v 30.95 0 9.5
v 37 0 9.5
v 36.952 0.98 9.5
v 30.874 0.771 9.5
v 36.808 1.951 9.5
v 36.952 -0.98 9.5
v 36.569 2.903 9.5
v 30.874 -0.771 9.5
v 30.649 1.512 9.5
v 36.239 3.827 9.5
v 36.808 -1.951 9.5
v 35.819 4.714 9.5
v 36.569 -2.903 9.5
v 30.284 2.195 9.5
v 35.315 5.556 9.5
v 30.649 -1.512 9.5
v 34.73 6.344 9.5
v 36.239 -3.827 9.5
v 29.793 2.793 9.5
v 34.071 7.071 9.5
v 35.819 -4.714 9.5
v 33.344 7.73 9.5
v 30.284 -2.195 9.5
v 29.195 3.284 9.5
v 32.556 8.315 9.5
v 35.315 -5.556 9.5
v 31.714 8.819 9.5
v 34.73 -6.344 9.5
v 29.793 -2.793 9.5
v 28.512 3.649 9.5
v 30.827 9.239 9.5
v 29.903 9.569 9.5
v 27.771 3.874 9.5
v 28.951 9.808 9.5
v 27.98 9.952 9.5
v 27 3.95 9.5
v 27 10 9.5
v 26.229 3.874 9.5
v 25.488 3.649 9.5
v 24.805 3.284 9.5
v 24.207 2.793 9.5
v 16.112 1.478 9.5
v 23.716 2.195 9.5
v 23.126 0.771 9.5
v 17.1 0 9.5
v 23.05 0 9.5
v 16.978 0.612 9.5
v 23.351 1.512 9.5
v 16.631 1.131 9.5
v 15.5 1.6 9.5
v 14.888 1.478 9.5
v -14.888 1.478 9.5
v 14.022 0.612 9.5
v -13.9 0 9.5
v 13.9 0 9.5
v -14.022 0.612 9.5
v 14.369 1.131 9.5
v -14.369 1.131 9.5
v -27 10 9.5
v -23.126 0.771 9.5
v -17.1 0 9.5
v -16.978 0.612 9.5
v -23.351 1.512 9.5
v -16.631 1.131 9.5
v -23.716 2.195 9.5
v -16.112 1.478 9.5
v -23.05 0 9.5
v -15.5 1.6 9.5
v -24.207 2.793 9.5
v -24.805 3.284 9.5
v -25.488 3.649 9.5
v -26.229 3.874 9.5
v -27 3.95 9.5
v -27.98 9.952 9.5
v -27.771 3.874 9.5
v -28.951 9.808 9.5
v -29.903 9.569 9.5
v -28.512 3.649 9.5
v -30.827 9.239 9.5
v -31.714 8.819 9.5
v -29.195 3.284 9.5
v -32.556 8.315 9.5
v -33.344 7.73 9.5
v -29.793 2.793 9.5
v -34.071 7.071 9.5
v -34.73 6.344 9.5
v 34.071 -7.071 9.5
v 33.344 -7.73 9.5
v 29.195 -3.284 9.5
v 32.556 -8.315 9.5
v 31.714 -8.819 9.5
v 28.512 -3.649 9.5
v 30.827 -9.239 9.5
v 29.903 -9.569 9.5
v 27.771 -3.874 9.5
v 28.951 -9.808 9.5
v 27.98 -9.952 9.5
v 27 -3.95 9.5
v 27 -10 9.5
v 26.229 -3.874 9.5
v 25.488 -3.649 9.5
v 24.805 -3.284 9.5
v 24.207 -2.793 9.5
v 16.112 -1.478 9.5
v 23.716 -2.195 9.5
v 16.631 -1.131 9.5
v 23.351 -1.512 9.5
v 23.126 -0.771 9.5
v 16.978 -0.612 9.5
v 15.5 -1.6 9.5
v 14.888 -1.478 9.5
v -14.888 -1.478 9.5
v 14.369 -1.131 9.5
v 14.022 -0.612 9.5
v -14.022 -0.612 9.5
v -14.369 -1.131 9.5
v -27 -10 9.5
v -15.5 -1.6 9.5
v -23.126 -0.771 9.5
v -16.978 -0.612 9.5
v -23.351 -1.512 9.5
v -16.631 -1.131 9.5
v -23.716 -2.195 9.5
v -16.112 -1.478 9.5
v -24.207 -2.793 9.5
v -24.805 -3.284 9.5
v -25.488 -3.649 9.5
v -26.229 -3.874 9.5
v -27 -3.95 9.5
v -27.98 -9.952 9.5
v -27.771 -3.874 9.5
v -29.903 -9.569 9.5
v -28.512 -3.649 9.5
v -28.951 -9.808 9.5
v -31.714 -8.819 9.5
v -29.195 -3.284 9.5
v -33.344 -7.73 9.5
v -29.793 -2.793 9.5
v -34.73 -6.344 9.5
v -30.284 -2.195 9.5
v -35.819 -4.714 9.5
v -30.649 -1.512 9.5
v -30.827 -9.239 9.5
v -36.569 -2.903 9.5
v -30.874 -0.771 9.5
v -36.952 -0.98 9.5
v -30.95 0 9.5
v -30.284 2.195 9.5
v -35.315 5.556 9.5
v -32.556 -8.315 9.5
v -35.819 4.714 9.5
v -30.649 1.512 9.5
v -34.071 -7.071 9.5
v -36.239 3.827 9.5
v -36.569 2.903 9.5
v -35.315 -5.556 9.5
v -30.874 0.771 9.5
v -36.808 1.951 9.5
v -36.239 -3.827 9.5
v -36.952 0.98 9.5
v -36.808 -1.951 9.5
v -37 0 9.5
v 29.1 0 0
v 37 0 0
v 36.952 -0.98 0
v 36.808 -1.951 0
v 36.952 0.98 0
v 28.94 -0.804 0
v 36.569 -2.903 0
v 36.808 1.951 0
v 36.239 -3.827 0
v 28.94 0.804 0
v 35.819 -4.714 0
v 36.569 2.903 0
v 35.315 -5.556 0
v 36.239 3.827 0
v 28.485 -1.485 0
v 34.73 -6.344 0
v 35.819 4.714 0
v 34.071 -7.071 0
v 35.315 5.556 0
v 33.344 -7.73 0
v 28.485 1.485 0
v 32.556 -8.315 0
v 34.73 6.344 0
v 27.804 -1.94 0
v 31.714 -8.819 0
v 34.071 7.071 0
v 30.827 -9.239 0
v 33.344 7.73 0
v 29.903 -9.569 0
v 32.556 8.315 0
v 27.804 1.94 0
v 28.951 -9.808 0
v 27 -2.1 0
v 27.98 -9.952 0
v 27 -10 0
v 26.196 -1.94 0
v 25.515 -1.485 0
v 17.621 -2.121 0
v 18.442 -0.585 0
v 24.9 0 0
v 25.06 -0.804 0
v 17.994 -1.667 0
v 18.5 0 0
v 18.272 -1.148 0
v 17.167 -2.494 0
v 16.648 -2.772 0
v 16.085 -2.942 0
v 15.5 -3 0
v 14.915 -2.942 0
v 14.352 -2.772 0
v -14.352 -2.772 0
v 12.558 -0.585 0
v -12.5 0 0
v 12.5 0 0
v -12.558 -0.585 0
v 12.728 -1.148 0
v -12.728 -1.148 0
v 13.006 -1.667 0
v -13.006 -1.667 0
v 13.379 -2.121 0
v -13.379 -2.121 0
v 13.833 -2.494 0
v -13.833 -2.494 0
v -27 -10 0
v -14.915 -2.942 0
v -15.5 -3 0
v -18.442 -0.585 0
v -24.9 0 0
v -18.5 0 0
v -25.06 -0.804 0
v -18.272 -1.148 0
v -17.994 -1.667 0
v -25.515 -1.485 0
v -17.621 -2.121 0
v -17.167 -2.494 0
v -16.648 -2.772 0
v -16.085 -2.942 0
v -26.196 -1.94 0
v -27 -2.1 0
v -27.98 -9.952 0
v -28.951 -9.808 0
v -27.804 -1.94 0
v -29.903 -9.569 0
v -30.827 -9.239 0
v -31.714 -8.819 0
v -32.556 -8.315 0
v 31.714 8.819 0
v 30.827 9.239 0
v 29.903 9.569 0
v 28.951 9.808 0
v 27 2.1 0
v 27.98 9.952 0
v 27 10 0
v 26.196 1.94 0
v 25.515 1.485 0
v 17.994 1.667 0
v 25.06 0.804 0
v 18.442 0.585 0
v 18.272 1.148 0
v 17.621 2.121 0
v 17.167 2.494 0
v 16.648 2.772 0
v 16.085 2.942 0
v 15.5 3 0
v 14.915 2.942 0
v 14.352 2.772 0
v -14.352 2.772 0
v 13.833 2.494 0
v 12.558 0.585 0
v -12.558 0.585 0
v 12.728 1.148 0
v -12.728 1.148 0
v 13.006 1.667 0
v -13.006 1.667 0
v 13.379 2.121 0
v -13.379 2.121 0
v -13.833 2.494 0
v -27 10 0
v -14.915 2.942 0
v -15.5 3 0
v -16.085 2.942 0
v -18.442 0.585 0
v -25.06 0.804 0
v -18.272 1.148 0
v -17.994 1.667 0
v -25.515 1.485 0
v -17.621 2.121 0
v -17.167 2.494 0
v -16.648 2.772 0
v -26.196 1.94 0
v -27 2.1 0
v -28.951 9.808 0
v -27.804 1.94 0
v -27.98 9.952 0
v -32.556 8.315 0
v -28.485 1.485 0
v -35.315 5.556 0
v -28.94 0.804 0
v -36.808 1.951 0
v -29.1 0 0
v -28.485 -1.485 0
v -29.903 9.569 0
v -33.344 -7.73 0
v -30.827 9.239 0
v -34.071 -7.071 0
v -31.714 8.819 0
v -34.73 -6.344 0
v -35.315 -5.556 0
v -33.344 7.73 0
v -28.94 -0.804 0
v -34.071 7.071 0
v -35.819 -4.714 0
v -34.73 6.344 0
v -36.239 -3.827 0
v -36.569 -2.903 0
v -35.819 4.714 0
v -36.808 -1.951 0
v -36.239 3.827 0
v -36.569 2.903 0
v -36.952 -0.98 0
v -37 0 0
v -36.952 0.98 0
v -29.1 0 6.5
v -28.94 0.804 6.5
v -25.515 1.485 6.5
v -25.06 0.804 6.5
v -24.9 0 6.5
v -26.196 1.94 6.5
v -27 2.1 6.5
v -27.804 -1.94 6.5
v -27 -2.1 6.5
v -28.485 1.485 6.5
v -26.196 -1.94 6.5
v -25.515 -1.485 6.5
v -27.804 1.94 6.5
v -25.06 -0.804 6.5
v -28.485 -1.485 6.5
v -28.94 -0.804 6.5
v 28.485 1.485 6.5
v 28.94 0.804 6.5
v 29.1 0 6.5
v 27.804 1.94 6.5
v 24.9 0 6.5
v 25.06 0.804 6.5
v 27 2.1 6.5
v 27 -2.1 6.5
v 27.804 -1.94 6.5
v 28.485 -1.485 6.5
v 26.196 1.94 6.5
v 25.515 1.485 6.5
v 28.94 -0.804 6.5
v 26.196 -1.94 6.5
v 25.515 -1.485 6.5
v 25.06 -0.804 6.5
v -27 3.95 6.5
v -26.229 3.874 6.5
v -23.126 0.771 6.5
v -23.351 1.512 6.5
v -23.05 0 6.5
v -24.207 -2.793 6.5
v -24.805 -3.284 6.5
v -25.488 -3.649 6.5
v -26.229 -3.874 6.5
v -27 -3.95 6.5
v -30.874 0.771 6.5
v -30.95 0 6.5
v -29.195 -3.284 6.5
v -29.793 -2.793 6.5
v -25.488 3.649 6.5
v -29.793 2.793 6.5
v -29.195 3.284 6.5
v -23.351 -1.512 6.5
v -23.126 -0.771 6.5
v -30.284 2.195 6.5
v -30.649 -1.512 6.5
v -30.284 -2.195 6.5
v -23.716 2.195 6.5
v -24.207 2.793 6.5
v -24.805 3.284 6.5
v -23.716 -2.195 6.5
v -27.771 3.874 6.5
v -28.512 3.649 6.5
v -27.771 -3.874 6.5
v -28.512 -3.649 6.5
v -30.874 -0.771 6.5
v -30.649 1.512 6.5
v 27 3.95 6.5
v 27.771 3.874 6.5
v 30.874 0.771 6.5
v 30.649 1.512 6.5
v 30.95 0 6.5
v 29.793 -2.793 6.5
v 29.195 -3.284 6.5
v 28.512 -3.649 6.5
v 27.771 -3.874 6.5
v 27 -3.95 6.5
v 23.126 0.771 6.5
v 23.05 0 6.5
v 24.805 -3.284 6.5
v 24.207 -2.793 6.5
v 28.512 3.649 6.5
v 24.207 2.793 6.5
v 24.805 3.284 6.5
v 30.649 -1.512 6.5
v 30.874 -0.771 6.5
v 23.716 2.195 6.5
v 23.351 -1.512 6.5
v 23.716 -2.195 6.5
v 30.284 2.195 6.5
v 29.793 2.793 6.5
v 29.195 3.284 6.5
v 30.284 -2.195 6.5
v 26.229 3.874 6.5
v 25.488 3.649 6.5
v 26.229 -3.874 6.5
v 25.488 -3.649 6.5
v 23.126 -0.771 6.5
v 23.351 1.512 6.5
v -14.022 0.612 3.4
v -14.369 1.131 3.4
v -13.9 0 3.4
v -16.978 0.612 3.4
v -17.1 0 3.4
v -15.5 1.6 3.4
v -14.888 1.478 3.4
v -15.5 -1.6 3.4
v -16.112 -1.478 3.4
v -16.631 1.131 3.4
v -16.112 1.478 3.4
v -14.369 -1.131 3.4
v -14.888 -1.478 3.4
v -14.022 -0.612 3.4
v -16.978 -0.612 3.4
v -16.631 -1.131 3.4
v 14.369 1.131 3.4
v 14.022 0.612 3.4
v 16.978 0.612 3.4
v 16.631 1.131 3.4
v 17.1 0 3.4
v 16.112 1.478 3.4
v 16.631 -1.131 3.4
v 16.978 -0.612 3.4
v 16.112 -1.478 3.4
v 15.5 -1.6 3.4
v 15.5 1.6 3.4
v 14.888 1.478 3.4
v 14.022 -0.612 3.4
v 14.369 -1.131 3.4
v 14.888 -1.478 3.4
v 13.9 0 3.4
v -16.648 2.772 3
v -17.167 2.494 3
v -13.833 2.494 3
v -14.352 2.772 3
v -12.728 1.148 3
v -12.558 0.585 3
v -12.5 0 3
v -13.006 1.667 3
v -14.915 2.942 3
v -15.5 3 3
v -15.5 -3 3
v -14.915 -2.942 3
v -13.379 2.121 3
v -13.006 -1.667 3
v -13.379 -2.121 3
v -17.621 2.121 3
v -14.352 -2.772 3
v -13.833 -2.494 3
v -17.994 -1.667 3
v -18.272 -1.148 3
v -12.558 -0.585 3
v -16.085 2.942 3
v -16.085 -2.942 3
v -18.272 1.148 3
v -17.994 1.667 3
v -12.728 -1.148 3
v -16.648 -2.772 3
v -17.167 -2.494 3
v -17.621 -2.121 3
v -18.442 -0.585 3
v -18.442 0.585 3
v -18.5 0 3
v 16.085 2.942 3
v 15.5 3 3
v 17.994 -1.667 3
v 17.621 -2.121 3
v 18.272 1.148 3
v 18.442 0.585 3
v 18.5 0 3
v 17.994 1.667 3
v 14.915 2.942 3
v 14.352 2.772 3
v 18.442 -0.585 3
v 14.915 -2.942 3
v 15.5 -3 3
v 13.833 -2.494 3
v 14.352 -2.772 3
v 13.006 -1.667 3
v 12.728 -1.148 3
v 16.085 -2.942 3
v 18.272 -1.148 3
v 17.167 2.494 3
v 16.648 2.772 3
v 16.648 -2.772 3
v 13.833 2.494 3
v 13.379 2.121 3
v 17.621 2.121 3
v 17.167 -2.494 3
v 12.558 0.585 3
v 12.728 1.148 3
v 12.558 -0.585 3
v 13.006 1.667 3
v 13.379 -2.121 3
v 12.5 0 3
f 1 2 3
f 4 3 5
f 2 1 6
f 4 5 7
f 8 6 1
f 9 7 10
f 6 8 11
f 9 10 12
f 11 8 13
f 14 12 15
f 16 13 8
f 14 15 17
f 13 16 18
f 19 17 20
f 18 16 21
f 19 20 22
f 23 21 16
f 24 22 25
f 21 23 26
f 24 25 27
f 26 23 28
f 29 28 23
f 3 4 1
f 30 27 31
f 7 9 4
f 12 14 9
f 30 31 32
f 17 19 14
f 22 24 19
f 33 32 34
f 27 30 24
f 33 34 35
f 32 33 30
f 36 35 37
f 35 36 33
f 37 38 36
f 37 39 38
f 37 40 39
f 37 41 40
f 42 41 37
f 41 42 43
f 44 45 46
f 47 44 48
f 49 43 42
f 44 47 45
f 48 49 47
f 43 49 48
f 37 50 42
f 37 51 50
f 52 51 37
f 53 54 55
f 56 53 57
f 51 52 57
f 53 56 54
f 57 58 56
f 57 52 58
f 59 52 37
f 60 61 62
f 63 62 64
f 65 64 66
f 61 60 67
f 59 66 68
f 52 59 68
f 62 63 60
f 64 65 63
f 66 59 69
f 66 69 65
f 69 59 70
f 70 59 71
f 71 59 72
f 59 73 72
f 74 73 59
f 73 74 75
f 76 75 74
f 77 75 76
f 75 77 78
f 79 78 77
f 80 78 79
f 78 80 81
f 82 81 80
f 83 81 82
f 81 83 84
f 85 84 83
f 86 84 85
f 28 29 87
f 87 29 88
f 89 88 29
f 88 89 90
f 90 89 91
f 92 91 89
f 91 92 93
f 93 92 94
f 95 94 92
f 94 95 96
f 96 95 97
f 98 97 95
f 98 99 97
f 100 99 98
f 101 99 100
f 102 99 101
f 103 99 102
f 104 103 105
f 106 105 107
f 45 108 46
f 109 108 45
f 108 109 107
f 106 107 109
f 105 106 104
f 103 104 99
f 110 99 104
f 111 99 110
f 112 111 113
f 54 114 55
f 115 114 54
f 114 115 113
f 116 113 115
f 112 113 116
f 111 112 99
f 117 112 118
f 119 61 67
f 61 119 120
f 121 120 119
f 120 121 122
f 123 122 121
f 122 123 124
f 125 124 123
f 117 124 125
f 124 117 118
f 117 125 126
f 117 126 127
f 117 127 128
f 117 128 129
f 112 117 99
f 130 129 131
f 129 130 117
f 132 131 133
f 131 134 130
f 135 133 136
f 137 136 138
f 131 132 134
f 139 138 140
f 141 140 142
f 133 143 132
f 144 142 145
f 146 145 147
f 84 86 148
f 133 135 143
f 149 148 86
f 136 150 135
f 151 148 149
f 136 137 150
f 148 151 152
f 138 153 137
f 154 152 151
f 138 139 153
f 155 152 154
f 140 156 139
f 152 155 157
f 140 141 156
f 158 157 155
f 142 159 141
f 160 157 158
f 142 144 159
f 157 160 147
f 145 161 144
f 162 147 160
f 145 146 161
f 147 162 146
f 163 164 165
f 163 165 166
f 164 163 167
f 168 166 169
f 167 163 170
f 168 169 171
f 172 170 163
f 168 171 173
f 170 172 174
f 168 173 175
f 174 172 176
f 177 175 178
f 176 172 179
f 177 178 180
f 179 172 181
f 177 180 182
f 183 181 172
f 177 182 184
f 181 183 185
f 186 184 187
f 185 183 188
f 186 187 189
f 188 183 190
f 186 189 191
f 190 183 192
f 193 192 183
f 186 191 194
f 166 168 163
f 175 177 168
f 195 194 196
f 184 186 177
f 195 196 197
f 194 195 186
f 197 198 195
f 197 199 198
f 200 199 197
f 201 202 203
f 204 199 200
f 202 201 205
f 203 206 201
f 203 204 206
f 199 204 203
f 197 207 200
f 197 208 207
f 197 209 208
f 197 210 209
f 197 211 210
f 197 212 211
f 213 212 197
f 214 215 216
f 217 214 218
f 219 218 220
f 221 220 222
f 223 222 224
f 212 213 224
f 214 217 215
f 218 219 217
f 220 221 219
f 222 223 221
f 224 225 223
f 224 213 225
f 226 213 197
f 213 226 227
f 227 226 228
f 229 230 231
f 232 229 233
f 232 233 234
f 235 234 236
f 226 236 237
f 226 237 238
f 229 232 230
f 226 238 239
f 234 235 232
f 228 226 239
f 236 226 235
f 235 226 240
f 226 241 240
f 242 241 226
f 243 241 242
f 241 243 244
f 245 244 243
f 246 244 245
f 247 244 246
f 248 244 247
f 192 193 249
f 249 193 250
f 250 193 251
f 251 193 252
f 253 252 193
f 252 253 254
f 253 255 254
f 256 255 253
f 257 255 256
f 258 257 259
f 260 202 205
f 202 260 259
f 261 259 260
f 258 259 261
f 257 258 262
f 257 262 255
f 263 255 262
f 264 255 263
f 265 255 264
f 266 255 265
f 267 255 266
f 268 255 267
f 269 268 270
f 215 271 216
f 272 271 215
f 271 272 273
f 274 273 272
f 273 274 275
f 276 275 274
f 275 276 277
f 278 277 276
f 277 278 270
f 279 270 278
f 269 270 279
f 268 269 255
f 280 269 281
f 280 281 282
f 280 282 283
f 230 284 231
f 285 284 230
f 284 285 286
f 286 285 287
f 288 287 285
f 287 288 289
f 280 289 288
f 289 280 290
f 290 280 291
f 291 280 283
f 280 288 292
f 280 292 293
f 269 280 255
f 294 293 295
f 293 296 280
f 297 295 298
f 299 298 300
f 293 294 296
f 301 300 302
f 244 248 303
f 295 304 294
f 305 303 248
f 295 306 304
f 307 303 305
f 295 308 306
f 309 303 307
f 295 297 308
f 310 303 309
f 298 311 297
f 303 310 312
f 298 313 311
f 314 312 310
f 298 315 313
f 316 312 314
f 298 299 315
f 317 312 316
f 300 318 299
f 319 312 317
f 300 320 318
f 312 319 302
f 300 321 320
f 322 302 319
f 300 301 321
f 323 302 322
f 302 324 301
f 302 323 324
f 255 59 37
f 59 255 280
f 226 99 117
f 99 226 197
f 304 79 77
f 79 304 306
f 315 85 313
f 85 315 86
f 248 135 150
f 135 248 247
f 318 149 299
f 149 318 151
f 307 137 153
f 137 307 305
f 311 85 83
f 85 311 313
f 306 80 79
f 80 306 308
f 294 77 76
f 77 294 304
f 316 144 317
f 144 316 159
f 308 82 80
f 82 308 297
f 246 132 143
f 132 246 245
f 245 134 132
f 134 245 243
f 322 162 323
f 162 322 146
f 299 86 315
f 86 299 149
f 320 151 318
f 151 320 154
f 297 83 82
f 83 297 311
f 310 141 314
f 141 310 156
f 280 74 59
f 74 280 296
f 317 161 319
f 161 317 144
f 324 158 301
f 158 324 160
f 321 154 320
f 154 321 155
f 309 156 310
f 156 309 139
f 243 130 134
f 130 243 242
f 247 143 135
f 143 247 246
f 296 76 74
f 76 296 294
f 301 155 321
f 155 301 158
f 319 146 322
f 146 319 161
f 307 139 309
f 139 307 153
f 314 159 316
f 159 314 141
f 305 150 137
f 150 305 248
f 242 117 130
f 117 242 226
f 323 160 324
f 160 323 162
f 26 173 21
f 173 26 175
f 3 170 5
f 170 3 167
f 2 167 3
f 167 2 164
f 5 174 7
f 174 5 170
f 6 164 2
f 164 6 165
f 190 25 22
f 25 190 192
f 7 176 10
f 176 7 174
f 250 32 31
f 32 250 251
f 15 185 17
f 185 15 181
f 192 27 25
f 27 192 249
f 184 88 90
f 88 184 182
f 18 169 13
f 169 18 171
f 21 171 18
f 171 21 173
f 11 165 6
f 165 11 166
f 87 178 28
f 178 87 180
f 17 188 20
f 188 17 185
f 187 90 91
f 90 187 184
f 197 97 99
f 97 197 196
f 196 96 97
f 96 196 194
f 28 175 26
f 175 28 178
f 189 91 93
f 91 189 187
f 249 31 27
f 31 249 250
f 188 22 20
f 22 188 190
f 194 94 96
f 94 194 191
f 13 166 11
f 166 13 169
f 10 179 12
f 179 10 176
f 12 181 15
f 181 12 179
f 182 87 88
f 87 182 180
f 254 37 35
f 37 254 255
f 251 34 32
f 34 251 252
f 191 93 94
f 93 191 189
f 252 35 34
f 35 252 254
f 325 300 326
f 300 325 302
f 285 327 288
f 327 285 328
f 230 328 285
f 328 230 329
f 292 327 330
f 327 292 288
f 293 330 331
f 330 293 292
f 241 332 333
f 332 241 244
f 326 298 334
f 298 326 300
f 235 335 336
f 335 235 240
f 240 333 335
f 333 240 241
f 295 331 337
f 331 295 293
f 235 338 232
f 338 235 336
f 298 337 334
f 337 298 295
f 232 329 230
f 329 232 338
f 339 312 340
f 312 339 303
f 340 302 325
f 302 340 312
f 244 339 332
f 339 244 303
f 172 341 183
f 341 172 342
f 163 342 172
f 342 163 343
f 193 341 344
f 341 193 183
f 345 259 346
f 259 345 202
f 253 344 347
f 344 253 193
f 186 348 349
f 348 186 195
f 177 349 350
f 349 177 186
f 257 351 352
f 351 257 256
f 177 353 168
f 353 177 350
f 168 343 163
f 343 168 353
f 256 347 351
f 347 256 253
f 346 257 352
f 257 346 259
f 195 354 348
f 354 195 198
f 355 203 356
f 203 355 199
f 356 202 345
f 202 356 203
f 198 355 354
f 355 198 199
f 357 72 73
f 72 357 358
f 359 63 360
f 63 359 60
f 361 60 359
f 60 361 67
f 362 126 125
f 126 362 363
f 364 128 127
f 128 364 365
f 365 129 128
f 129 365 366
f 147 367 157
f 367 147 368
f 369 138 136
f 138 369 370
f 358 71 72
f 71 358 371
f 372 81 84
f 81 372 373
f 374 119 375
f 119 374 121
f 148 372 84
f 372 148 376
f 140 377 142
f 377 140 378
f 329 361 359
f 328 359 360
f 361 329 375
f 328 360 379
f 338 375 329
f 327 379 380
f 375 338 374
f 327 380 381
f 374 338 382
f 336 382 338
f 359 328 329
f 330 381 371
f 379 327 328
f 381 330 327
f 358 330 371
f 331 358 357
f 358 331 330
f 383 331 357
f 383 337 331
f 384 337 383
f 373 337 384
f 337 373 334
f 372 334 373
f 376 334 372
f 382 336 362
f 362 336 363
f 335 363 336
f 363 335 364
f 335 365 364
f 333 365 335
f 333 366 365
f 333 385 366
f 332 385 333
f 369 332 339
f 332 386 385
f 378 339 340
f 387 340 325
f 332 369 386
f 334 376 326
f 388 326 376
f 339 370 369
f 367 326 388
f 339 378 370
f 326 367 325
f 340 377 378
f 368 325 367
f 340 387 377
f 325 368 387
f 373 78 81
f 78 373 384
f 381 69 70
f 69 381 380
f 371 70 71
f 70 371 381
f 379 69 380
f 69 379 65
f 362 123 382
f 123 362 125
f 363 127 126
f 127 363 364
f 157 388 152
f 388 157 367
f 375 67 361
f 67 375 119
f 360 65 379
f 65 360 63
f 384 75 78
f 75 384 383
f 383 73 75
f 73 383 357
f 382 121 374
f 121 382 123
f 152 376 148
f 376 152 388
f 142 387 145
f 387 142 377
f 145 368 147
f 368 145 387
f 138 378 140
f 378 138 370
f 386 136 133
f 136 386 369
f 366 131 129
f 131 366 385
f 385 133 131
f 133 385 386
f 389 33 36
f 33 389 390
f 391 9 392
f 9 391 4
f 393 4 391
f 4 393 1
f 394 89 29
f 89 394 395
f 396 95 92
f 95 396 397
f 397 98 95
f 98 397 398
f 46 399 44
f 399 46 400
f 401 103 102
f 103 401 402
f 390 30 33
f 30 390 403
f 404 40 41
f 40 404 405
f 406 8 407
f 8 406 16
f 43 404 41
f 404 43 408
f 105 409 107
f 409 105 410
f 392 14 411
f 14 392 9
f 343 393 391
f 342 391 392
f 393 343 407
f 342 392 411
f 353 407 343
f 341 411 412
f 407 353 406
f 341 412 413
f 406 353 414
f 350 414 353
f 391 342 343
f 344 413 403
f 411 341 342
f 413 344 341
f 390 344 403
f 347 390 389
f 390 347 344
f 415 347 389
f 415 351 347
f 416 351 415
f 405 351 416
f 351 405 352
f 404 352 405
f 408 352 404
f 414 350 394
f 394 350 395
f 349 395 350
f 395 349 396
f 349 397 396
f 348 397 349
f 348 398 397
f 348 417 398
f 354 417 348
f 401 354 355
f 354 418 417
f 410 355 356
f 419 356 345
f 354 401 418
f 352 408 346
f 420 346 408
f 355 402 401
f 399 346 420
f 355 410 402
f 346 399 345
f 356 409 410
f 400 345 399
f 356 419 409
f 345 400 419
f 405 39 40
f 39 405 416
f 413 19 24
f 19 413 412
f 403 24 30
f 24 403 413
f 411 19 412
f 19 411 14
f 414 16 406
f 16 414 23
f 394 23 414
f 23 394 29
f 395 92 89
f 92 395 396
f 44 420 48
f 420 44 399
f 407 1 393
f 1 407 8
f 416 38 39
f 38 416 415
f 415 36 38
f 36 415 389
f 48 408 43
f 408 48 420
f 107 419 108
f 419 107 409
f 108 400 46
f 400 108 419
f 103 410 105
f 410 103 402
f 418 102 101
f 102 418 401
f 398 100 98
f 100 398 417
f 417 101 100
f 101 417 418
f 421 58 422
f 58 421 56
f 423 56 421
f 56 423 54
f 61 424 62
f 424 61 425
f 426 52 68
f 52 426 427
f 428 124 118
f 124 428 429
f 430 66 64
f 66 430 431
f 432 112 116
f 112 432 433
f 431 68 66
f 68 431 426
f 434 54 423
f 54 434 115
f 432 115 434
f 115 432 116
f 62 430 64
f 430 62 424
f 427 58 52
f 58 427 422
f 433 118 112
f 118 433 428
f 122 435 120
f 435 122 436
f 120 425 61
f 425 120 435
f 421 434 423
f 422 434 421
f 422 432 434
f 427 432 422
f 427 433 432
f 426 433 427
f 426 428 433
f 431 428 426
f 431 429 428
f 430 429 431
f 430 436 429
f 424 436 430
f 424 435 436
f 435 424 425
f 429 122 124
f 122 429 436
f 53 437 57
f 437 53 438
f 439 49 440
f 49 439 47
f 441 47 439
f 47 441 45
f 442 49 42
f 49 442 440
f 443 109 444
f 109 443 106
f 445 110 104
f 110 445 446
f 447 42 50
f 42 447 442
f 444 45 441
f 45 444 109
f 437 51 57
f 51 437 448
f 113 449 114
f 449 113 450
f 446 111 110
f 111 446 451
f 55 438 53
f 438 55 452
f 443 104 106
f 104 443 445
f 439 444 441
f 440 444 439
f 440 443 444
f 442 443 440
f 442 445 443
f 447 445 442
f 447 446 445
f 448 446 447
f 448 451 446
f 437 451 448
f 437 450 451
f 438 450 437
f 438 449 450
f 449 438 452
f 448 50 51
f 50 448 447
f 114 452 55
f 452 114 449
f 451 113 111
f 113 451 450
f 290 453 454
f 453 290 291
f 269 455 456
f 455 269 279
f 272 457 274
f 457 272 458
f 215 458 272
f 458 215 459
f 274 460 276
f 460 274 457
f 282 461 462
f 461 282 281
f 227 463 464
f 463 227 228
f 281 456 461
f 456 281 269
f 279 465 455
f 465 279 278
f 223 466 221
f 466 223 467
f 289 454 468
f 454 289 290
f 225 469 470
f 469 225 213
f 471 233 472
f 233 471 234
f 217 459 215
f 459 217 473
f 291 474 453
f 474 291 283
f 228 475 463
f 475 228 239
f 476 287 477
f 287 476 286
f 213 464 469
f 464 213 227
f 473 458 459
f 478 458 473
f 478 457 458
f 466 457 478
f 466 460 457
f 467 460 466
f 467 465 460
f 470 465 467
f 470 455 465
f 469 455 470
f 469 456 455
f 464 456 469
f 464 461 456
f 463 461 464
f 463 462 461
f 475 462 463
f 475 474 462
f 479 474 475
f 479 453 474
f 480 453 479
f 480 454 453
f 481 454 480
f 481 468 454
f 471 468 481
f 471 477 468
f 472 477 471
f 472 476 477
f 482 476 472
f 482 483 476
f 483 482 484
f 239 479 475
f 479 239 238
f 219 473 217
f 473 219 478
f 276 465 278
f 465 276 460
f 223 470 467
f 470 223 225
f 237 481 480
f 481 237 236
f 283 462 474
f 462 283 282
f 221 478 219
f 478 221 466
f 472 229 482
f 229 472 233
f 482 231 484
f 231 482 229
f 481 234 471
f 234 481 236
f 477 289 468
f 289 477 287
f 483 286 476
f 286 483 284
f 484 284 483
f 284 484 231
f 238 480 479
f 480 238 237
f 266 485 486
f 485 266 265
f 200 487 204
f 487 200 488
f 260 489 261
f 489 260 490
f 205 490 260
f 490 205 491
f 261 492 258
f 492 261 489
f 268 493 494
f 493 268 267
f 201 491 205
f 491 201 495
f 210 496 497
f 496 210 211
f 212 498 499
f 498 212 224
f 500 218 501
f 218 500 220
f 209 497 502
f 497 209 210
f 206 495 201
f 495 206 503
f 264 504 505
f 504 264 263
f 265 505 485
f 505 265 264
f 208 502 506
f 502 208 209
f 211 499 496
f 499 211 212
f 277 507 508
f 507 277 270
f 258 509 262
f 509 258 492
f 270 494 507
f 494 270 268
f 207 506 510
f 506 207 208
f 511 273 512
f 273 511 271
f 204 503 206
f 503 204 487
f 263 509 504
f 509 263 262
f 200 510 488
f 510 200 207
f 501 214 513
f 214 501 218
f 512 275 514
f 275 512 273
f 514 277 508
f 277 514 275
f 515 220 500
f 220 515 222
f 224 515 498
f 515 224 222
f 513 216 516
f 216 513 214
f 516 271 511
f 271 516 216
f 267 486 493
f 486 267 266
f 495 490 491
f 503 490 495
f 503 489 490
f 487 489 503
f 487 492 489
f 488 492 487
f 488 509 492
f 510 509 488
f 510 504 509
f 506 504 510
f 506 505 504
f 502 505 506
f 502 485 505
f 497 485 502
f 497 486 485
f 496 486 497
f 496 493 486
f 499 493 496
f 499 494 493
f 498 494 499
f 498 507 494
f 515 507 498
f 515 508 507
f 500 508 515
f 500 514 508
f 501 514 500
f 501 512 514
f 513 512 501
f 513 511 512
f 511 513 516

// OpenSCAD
// Mounting brackey for Ormerod extruder on 2020 Kossel
// The body screws on a JK42HS34-1334A motor are 26mm long and are recessed by 2.5mm, total 28.5mm.
// Therefore we can use a 35mm screw to fix trhe bracket to the motor if the screw goes through 6.5mm of plastic.

width=20;
m3headClear=5.6+0.4;
m3clear=3+0.2;
m3headDepth=3;
thickness=6.5+m3headDepth;
m4clear=4+0.2;
m4headClear=7.5+0.4;
m4headDepth=3;

nema17holeSpacing=31;
nema17body=42;

mountingHoleSpacing = nema17body + 2*6;
overlap=0.02;

difference() {
	union() {
		translate([0,0,thickness/2]) cube([mountingHoleSpacing,width,thickness],center=true);
		translate([-mountingHoleSpacing/2,0,0]) cylinder(r=width/2,h=thickness, $fn=64);
		translate([mountingHoleSpacing/2,0,0]) cylinder(r=width/2,h=thickness, $fn=64);
	}

	translate([-mountingHoleSpacing/2,0,-overlap]) cylinder(r=m4clear/2,h=thickness+2*overlap, $fn=16);
	translate([mountingHoleSpacing/2,0,-overlap]) cylinder(r=m4clear/2,h=thickness+2*overlap, $fn=16);
	translate([-mountingHoleSpacing/2,0,thickness-m4headDepth])
		cylinder(r=m4headClear/2,h=thickness, $fn=32);
	translate([mountingHoleSpacing/2,0,thickness-m4headDepth])
		cylinder(r=m4headClear/2,h=thickness, $fn=32);


	translate([-nema17holeSpacing/2,0,m3headDepth+0.4]) cylinder(r=m3clear/2,h=thickness, $fn=16);
	translate([nema17holeSpacing/2,0,m3headDepth+0.4]) cylinder(r=m3clear/2,h=thickness, $fn=16);

	translate([-nema17holeSpacing/2,0,-overlap])
		cylinder(r=m3headClear/2,h=m3headDepth+overlap, $fn=32);
	translate([nema17holeSpacing/2,0,-overlap])
		cylinder(r=m3headClear/2,h=m3headDepth+overlap, $fn=32);
}
